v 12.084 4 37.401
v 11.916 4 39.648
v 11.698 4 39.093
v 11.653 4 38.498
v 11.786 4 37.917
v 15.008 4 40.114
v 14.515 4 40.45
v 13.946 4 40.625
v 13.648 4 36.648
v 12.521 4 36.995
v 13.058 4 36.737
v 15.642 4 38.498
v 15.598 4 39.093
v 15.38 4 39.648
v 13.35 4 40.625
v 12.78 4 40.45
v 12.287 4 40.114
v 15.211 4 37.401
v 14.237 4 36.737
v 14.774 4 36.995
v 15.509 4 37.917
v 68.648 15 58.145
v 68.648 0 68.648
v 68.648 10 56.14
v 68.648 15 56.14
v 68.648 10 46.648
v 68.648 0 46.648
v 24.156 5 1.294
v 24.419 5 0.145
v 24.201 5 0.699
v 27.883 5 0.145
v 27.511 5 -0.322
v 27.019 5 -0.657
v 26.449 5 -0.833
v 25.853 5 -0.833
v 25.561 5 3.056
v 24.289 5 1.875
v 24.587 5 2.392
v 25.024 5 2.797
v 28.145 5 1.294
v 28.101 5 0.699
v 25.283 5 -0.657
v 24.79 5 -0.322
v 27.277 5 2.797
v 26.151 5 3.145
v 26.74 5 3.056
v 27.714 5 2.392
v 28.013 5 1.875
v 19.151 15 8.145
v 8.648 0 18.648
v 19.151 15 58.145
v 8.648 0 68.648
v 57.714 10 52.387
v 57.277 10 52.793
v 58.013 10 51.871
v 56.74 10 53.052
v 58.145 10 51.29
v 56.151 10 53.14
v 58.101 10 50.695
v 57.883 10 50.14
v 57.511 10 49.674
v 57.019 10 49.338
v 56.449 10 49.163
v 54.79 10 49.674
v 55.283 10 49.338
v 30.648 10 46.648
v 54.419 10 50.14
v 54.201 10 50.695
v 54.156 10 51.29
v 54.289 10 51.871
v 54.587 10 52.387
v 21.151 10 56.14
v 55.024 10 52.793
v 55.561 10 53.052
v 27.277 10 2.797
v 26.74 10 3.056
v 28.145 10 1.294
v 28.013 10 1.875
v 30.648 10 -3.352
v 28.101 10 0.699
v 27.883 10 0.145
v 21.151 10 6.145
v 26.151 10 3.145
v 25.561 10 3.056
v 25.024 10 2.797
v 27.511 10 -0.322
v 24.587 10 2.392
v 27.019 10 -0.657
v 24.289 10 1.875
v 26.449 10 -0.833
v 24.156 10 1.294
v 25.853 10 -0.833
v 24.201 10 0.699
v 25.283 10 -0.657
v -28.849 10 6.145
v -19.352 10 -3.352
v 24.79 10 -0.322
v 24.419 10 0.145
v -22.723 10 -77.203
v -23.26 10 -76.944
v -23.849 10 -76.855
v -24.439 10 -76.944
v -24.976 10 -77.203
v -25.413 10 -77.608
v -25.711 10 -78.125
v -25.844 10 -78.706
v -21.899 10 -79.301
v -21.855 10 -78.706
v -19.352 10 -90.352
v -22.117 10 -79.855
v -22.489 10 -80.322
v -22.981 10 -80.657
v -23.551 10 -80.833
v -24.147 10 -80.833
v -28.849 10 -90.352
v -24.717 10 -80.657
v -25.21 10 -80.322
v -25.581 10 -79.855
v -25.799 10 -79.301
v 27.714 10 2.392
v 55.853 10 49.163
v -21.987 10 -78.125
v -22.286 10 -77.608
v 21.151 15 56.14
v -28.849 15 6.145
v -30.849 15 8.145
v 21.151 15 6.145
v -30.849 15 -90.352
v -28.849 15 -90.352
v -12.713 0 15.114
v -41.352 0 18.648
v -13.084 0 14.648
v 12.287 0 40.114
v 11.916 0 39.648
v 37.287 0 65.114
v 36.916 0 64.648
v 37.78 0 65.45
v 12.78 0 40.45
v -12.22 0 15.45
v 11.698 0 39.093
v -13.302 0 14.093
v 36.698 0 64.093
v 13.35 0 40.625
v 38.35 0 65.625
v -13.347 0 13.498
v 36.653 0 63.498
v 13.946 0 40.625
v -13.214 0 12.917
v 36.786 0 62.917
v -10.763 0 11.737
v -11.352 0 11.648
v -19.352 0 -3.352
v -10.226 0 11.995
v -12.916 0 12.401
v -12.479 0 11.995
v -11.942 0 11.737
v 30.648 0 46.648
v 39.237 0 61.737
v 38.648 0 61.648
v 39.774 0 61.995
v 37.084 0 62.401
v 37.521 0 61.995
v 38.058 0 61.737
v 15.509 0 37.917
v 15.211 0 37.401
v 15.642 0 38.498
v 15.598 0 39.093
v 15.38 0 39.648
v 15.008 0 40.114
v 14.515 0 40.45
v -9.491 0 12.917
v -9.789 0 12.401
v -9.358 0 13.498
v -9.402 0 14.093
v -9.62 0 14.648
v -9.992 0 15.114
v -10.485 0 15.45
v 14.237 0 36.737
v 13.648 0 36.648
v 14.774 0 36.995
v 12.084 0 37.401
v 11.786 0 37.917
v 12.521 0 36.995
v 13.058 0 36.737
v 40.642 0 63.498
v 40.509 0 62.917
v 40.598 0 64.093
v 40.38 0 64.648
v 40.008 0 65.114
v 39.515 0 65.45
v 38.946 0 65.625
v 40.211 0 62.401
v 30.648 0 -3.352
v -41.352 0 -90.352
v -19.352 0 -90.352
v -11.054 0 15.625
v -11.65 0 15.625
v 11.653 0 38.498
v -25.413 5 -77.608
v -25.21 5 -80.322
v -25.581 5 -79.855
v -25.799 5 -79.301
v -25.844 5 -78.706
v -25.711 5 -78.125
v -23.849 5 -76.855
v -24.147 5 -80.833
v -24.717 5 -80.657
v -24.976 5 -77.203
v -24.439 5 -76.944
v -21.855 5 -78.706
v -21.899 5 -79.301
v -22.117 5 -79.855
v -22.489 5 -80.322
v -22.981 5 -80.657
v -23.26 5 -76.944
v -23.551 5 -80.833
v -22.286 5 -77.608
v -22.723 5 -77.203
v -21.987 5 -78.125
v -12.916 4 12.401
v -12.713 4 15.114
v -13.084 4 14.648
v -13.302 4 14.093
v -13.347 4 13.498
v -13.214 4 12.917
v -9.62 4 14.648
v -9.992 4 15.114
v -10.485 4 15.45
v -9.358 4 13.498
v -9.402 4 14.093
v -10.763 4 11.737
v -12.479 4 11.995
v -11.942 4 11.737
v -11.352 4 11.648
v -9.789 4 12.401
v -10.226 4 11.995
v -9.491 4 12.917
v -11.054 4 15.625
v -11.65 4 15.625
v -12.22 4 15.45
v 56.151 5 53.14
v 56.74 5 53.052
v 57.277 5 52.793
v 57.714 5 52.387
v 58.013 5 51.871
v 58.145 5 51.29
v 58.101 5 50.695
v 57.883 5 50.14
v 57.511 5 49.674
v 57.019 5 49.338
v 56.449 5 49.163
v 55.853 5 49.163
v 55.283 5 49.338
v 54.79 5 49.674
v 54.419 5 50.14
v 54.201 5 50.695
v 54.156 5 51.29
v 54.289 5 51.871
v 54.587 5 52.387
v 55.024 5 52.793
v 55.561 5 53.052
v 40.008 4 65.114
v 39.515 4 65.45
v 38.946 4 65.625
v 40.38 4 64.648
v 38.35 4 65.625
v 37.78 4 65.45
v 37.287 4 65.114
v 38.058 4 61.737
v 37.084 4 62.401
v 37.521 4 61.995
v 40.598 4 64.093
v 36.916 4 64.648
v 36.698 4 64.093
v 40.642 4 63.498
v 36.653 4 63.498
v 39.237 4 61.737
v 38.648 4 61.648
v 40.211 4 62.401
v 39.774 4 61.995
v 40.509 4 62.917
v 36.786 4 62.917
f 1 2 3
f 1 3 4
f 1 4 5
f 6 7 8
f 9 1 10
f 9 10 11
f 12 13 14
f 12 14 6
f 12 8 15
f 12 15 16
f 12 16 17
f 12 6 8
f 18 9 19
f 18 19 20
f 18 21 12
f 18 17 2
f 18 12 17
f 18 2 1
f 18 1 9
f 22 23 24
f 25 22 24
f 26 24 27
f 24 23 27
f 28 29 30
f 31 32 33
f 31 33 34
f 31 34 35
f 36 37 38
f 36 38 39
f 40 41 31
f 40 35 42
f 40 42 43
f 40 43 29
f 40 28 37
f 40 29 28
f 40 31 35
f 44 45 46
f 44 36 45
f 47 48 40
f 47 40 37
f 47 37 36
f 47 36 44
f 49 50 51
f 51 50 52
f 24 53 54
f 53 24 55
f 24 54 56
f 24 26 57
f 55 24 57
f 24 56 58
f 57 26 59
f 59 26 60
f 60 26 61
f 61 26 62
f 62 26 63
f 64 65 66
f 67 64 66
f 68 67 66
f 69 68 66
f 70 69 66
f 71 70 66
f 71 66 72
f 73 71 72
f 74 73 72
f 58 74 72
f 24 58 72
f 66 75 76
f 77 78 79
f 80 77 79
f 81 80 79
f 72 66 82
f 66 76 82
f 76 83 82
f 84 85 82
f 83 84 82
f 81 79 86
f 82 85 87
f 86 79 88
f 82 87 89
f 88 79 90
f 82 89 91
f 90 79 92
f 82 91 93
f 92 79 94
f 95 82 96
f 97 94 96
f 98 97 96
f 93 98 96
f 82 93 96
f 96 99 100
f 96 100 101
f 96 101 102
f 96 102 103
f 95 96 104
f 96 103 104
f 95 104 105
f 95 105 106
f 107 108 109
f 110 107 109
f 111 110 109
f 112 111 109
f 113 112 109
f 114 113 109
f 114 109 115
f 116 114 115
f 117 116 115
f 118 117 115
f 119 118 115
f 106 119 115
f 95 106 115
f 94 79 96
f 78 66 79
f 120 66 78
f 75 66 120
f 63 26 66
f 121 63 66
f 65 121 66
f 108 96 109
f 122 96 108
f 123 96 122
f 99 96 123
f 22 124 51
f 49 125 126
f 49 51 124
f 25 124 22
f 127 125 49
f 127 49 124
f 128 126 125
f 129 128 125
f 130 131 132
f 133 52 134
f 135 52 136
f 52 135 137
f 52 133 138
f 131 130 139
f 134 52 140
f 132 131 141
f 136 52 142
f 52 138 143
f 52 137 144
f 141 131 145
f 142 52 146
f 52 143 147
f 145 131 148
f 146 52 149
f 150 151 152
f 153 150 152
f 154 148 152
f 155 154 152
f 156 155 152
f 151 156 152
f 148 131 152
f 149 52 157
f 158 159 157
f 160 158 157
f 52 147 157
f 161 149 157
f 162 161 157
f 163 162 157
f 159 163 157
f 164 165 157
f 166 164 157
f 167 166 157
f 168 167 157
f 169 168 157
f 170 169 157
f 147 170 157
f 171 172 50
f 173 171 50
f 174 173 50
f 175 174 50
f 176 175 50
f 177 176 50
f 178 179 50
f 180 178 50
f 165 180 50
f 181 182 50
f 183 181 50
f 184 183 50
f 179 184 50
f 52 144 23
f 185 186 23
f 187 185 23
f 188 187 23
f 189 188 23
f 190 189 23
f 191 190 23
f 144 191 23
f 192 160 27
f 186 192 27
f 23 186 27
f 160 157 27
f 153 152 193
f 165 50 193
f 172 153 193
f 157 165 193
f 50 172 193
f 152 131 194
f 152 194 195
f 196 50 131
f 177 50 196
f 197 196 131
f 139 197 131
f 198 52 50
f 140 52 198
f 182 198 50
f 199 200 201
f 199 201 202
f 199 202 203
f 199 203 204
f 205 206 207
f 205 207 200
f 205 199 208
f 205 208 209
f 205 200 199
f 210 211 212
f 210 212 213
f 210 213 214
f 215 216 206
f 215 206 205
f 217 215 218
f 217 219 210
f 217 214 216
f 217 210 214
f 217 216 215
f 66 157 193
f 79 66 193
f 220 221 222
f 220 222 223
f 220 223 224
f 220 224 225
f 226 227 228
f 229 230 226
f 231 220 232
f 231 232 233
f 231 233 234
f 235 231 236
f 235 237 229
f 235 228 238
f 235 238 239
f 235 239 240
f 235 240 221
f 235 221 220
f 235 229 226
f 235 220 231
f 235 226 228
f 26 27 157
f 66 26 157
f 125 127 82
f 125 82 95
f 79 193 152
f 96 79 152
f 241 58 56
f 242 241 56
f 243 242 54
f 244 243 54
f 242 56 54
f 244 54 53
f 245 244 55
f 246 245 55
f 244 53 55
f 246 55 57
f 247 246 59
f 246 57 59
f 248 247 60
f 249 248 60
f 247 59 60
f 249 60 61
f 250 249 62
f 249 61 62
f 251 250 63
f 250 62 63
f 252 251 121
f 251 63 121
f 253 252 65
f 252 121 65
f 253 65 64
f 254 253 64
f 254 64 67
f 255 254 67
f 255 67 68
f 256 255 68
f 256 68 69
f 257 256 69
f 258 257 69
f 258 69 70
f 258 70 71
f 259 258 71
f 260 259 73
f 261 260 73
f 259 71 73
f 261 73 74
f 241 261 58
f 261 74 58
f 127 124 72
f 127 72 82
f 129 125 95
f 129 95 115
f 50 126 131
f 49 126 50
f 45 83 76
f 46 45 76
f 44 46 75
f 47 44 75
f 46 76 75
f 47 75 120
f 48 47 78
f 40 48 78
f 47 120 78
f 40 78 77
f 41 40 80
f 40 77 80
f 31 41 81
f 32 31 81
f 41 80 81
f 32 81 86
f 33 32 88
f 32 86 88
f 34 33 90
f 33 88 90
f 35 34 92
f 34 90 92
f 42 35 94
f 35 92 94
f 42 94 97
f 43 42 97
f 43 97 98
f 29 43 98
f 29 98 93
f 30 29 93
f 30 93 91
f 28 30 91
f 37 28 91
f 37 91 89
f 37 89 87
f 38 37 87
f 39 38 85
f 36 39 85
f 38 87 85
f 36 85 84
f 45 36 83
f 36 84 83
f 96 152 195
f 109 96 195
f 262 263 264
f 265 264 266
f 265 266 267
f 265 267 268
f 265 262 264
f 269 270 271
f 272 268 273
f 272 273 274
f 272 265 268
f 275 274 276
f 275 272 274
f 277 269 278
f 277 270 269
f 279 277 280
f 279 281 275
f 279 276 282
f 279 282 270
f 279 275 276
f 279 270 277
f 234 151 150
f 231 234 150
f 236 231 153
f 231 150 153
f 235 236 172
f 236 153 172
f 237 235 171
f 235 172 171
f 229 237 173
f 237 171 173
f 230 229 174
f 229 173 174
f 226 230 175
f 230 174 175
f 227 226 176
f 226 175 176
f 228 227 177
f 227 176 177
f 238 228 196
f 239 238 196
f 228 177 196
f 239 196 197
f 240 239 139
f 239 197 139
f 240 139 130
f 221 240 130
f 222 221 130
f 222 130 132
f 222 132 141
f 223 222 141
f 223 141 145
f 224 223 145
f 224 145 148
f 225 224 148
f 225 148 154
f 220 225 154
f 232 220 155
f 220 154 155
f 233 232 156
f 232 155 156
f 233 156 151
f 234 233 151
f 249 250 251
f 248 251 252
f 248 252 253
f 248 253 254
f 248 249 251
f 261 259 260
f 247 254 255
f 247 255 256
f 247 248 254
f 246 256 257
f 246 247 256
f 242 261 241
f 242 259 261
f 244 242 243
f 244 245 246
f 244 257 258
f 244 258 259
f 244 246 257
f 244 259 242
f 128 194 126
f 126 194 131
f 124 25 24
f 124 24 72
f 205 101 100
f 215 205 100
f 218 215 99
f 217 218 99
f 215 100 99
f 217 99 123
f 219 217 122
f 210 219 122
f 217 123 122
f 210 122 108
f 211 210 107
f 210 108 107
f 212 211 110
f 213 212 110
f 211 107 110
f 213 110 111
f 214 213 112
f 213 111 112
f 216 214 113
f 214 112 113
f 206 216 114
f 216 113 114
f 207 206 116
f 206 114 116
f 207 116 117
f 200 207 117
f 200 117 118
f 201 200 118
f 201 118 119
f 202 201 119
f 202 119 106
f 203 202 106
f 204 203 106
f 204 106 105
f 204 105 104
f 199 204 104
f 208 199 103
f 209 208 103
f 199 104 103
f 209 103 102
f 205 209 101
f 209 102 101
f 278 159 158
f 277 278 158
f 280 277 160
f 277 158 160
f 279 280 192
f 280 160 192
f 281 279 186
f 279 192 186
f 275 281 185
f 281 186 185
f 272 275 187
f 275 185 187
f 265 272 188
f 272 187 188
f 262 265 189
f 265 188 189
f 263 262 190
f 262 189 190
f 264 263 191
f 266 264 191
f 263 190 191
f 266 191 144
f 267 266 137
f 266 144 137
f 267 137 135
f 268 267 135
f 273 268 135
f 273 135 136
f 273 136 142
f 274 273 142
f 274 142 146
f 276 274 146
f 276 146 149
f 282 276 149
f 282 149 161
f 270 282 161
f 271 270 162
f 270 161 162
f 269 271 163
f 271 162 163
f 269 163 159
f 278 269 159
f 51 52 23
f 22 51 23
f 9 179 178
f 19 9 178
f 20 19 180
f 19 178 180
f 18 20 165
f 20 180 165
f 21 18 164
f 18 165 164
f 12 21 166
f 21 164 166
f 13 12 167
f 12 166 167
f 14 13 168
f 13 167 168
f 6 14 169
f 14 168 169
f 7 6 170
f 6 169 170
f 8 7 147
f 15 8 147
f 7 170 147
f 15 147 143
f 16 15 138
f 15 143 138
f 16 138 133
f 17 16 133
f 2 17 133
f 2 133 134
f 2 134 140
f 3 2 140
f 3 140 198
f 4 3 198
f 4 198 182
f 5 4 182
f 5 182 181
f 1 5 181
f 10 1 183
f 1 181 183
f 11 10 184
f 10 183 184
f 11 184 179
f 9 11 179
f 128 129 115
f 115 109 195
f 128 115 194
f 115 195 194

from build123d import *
from OCP.BRepFilletAPI import BRepFilletAPI_MakeChamfer

# Parameters (mm, degrees)
BOSS_EXTRU_1_DEPTH      = 15
CHANFREIN1_SIZE         = 10.503113073
CHANFREIN1_SIZE_2       = 15
ESQUISSE4_R             = 2
ENL_V_MAT_EXTRU_3_DEPTH = 4
ENL_V_MAT_EXTRU_5_DEPTH = 5
ESQUISSE6_R             = 2
ENL_V_MAT_EXTRU_6_DEPTH = 5


with BuildPart() as part:
    # Esquisse1 → Boss.-Extru.1 (new body)
    with BuildSketch(Plane(origin=(0, 0, 0), x_dir=(1, 0, 0), z_dir=(0, 1, 0))):
        Polygon((-41.352348911, -18.647651089), (8.647651089, -18.647651089), (8.647651089, -68.647651089), (68.647651089, -68.647651089), (68.647651089, -46.647651089), (30.647651089, -46.647651089), (30.647651089, 3.352348911), (-19.352348911, 3.352348911), (-19.352348911, 41.352348911), (-19.352348911, 90.352348911), (-41.352348911, 90.352348911), (-41.352348911, 41.352348911), align=None)
    extrude(amount=BOSS_EXTRU_1_DEPTH)

    # Chanfrein1
    chanfrein1_edges_1 = [part.edges().sort_by_distance(p)[0] for p in [
        (38.647651089, 15, 68.647651089),
    ]]
    chanfrein1_side_1 = [part.faces().sort_by_distance(p)[0] for p in [
        (38.647651089, 15, 68.437588827),
    ]]
    chanfrein1_edges_2 = [part.edges().sort_by_distance(p)[0] for p in [
        (8.647651089, 15, 43.647651089),
    ]]
    chanfrein1_side_2 = [part.faces().sort_by_distance(p)[0] for p in [
        (8.85771335, 15, 43.647651089),
    ]]
    chanfrein1_edges_3 = [part.edges().sort_by_distance(p)[0] for p in [
        (-16.352348911, 15, 18.647651089),
    ]]
    chanfrein1_side_3 = [part.faces().sort_by_distance(p)[0] for p in [
        (-16.352348911, 14.789937739, 18.647651089),
    ]]
    chanfrein1_edges_4 = [part.edges().sort_by_distance(p)[0] for p in [
        (-41.352348911, 15, -35.852348911),
    ]]
    chanfrein1_side_4 = [part.faces().sort_by_distance(p)[0] for p in [
        (-41.14228665, 15, -35.852348911),
    ]]
    chanfrein1 = BRepFilletAPI_MakeChamfer(part.part.solid().wrapped)
    for e in chanfrein1_edges_1:
        chanfrein1.Add(CHANFREIN1_SIZE - 0.0001, CHANFREIN1_SIZE_2 - 0.0001, e.wrapped, chanfrein1_side_1[0].wrapped)
    for e in chanfrein1_edges_2:
        chanfrein1.Add(CHANFREIN1_SIZE - 0.0001, CHANFREIN1_SIZE_2 - 0.0001, e.wrapped, chanfrein1_side_2[0].wrapped)
    for e in chanfrein1_edges_3:
        chanfrein1.Add(CHANFREIN1_SIZE_2 - 0.0001, CHANFREIN1_SIZE - 0.0001, e.wrapped, chanfrein1_side_3[0].wrapped)
    for e in chanfrein1_edges_4:
        chanfrein1.Add(CHANFREIN1_SIZE - 0.0001, CHANFREIN1_SIZE_2 - 0.0001, e.wrapped, chanfrein1_side_4[0].wrapped)
    add(Compound.cast(chanfrein1.Shape()), mode=Mode.REPLACE)  # a hair under: the kernel refuses the full size

    # Esquisse4 → Enlèv. mat.-Extru.3 (cut)
    with BuildSketch(Plane.XZ):
        with Locations(Location((38.647651089, 63.647651089, 0), (0, 0, 270))):
            Circle(ESQUISSE4_R)
        with Locations(Location((13.647651089, 38.647651089, 0), (0, 0, 270))):
            Circle(ESQUISSE4_R)
        with Locations(Location((-11.352348911, 13.647651089, 0), (0, 0, 270))):
            Circle(ESQUISSE4_R)
    extrude(amount=-ENL_V_MAT_EXTRU_3_DEPTH, mode=Mode.SUBTRACT)

    # Esquisse5 → Enlèv. mat.-Extru.5 (cut)
    with BuildSketch(Plane(origin=(0, 15, 0), x_dir=(1, 0, 0), z_dir=(0, 1, 0))):
        Polygon((-19.352348911, 3.352348911), (30.647651089, 3.352348911), (30.647651089, -46.647651089), (68.647651089, -46.647651089), (68.647651089, -56.140382231), (21.150764162, -56.140382231), (21.150764162, -6.144538016), (-28.849235838, -6.144538016), (-28.849235838, 90.352348911), (-19.352348911, 90.352348911), align=None)
    extrude(amount=-ENL_V_MAT_EXTRU_5_DEPTH, mode=Mode.SUBTRACT)

    # Esquisse6 → Enlèv. mat.-Extru.6 (cut)
    with BuildSketch(Plane(origin=(0, 10, 0), x_dir=(1, 0, 0), z_dir=(0, 1, 0))):
        with Locations(Location((-23.849235838, 78.855461984, 0), (0, 0, 270))):
            Circle(ESQUISSE6_R)
        with Locations(Location((26.150764162, -1.144538016, 0), (0, 0, 270))):
            Circle(ESQUISSE6_R)
        with Locations(Location((56.150764162, -51.140382231, 0), (0, 0, 270))):
            Circle(ESQUISSE6_R)
    extrude(amount=-ENL_V_MAT_EXTRU_6_DEPTH, mode=Mode.SUBTRACT)


solid = part.part
